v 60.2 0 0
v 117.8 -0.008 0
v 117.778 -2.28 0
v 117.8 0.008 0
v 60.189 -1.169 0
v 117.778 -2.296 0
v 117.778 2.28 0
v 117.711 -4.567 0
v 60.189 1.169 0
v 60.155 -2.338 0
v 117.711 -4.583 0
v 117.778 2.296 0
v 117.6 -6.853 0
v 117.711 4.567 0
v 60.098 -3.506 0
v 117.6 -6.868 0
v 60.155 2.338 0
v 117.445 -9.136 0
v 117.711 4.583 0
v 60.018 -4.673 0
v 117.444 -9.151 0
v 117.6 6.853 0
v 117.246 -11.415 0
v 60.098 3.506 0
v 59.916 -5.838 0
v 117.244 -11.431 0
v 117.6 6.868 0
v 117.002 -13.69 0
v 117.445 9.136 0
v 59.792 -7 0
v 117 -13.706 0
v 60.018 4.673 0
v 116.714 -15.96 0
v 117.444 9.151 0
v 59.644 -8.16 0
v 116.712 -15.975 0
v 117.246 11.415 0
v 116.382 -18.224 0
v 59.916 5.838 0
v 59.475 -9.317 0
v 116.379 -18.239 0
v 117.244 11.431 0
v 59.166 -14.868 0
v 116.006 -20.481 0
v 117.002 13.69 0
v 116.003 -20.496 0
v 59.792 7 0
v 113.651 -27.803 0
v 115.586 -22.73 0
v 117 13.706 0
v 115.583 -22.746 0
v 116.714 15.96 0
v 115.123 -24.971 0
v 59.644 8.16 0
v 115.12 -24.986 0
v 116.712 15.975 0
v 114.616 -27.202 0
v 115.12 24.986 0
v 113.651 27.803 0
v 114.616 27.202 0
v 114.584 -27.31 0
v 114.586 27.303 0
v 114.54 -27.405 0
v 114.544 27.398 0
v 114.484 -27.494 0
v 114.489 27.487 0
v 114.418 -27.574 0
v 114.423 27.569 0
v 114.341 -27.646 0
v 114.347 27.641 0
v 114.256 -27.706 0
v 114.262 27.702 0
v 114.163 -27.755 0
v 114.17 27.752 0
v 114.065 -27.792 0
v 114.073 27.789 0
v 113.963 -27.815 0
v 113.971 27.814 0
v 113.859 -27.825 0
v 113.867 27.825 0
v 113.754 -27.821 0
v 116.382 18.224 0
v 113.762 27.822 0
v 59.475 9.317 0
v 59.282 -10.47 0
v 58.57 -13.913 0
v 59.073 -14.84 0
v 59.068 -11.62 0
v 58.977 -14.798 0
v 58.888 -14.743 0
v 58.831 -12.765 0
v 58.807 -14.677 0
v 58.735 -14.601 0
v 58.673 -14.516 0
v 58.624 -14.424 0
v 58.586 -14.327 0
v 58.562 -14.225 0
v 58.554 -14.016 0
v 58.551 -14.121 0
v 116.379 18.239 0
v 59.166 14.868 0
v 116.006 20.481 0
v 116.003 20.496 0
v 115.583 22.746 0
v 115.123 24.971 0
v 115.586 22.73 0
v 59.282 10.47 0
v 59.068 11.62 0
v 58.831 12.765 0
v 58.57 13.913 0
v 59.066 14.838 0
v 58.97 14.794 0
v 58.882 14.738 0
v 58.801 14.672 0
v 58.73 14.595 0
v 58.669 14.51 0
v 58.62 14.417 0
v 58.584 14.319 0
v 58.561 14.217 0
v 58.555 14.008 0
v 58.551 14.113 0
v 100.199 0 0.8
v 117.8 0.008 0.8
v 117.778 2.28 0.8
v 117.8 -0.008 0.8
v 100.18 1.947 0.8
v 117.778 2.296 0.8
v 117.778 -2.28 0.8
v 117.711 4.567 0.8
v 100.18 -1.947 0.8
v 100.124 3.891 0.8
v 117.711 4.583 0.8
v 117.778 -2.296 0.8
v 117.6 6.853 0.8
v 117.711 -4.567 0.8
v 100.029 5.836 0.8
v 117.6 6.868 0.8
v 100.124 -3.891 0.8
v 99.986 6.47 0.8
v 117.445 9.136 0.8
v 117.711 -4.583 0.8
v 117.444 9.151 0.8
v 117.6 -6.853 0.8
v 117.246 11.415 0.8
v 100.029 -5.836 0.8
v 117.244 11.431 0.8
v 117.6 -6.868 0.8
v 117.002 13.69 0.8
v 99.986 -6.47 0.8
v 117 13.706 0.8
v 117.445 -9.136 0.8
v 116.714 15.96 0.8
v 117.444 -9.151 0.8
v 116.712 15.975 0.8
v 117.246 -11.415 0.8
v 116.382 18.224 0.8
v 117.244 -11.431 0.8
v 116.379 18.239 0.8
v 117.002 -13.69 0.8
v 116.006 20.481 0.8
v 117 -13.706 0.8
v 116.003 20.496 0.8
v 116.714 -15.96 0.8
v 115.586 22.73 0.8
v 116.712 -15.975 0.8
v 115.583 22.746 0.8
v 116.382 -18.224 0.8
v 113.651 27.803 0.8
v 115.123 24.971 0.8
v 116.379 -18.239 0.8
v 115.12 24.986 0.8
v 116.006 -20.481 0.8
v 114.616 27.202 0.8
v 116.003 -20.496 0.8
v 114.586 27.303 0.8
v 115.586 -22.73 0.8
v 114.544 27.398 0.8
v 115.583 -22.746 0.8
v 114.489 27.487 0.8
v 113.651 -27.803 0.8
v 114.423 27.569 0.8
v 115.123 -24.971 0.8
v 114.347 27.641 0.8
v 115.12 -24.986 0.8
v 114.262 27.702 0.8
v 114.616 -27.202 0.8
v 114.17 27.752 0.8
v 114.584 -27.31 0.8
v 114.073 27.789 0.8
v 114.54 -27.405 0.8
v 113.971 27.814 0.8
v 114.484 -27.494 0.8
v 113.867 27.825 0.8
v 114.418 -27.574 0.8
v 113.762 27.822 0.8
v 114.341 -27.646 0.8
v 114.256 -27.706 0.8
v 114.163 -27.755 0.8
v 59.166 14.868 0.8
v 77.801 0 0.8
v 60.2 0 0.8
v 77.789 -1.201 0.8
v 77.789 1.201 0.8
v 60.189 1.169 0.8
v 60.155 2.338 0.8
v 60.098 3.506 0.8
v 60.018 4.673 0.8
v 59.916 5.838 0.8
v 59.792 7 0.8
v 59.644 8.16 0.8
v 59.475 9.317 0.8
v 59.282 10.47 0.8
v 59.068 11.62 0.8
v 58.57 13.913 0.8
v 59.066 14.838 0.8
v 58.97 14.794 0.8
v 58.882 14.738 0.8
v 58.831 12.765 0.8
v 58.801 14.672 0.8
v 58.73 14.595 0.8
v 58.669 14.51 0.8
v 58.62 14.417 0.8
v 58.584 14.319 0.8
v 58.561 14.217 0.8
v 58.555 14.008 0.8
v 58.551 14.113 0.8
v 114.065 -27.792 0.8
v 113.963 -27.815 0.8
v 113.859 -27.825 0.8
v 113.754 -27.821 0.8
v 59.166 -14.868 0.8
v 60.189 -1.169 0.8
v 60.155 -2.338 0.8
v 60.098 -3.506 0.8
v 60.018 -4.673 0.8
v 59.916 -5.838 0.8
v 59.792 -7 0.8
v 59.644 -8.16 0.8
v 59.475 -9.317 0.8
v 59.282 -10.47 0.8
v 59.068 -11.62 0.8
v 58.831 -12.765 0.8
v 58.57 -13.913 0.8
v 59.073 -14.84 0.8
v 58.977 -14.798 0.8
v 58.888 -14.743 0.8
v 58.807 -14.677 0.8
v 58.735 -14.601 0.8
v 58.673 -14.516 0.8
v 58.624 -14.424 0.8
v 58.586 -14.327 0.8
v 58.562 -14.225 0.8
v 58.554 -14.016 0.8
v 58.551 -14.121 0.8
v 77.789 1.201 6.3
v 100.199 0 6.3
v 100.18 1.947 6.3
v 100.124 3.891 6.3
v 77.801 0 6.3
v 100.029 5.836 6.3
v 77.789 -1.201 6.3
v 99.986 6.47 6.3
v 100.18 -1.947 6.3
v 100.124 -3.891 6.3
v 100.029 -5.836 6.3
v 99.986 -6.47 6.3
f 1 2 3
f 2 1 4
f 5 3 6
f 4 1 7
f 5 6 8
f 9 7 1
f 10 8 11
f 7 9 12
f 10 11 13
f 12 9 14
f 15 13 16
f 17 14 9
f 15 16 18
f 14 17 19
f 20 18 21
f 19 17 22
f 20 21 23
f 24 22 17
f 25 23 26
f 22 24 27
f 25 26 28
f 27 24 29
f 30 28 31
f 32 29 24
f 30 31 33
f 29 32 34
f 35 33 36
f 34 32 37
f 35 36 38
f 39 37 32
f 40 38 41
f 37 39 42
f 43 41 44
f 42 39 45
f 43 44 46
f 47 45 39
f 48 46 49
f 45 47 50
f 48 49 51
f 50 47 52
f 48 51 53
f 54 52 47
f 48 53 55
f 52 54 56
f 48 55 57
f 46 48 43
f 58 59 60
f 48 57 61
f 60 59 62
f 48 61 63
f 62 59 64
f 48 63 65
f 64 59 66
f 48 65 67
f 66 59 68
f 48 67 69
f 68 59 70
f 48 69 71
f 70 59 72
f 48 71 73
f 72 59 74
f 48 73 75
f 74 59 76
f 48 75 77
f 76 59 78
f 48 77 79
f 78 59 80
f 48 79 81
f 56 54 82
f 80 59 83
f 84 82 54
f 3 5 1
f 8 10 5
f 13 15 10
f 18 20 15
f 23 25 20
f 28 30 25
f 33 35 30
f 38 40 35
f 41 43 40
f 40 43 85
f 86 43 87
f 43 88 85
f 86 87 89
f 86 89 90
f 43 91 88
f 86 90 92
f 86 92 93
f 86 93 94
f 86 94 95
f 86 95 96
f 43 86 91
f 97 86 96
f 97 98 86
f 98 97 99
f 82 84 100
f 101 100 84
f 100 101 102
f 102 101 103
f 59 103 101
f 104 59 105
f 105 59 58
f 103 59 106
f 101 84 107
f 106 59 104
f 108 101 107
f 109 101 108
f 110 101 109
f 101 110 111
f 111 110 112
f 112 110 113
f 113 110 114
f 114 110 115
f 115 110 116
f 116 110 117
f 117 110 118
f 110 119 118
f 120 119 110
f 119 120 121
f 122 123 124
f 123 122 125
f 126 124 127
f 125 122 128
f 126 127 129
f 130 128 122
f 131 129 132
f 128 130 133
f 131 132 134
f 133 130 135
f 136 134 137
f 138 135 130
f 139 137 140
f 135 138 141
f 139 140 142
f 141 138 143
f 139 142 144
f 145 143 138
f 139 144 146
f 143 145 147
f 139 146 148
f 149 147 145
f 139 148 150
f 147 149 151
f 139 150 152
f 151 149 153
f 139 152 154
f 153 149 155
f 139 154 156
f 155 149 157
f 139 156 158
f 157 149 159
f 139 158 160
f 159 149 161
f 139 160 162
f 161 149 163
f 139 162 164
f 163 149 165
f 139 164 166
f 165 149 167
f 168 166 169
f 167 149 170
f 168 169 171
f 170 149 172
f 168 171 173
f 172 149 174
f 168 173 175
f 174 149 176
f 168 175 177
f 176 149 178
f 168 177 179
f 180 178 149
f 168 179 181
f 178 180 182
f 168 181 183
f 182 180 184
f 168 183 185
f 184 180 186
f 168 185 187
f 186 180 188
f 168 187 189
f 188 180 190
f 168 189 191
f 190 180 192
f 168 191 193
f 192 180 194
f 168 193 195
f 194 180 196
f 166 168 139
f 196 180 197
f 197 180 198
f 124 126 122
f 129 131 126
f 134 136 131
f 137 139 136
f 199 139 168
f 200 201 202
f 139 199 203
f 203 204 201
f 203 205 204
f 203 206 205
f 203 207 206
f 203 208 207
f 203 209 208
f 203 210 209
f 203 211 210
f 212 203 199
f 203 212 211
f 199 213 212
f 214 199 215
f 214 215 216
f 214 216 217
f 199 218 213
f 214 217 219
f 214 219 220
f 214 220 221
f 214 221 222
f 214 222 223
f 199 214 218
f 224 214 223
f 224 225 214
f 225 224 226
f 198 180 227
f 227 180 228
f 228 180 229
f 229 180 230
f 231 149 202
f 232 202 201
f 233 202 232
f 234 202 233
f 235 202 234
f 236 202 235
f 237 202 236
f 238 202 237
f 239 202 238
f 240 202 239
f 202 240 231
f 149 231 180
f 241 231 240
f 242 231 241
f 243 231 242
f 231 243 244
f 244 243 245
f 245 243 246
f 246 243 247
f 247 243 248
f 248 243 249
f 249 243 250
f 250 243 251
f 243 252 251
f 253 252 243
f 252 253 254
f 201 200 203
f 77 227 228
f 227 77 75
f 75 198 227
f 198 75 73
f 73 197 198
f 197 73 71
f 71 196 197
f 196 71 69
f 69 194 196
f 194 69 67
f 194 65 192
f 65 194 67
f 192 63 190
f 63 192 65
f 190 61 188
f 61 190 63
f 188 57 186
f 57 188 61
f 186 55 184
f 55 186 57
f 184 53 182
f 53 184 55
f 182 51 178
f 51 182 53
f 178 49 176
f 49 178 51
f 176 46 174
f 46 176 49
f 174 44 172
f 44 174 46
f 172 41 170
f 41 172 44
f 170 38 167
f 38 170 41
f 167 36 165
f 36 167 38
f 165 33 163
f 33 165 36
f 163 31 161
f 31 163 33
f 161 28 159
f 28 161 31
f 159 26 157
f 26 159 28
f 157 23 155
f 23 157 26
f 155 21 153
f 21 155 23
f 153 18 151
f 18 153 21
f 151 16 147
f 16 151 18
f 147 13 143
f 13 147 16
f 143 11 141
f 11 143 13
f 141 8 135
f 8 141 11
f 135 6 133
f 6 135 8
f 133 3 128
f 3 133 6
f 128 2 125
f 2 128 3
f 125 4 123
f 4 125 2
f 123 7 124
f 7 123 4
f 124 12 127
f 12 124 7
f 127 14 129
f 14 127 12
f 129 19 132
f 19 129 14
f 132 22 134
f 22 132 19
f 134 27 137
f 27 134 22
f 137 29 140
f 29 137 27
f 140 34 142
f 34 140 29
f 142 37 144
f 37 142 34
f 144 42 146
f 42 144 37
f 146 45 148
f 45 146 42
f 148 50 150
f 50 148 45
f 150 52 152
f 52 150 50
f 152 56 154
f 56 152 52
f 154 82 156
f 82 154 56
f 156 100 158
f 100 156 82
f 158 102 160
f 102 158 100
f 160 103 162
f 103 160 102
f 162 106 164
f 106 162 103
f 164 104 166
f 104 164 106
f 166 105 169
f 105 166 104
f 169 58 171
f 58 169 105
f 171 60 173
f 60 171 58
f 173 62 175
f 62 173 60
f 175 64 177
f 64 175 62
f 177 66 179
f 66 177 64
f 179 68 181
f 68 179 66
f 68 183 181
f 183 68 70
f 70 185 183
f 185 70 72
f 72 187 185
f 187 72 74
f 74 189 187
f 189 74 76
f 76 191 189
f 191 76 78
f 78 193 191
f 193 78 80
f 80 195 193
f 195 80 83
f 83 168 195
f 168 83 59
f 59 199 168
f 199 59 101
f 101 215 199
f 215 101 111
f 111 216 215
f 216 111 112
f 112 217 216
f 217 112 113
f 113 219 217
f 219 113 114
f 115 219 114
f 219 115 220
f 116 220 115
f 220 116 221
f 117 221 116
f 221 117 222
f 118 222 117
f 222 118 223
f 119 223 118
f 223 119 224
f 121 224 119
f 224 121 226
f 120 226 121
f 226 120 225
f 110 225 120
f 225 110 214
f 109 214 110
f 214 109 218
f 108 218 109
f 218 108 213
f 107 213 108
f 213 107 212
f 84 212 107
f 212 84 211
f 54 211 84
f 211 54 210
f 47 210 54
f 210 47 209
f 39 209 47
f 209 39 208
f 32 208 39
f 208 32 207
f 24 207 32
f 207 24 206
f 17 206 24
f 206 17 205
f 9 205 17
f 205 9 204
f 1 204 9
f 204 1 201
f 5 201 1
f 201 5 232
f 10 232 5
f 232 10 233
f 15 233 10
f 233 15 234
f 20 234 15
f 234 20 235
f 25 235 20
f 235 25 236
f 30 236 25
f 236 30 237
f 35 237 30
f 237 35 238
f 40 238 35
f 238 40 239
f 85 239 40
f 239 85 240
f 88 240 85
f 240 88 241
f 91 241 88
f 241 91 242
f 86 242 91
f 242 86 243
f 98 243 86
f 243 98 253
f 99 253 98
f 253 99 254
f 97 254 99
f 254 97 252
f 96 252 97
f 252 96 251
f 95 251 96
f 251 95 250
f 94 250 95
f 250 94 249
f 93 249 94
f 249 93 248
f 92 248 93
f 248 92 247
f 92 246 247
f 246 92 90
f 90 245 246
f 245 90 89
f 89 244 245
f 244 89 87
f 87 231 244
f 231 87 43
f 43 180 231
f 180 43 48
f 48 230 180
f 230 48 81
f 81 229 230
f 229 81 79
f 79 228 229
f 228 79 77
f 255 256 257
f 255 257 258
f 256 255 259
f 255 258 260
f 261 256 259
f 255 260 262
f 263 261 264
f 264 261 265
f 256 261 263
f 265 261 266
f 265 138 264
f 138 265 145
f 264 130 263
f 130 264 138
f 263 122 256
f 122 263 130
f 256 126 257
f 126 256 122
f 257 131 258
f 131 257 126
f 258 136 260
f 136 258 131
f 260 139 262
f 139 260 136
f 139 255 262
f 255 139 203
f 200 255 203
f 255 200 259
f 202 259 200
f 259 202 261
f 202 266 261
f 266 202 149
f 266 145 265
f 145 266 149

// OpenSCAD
// Gen-DA — bobbin BASE (bottom flange + hub). Print x12, flange down. Wind 24 AWG x 252 t around
// the hub with the LID glued on (coil_lid.stl). Copper lives ONLY between the flanges (no proud winds).
include <parameters.scad>;
$fn = 48;
module sector_2d(r_in, r_out, ang) {
    polygon([
        for (a = [-ang/2 : ang/24 : ang/2]) [r_in*cos(a), r_in*sin(a)],
        for (a = [ang/2 : -ang/24 : -ang/2]) [r_out*cos(a), r_out*sin(a)]
    ]);
}
module footprint_2d() { offset(r=wall) sector_2d(coil_id_r, coil_od_r, span_deg); }
module hub_2d()       { offset(delta=-coil_core_inset) sector_2d(coil_id_r, coil_od_r, span_deg); }

union() {
    linear_extrude(flange_t) footprint_2d();
    translate([0, 0, flange_t - 0.01]) linear_extrude(former_web + 0.01) hub_2d();
}
